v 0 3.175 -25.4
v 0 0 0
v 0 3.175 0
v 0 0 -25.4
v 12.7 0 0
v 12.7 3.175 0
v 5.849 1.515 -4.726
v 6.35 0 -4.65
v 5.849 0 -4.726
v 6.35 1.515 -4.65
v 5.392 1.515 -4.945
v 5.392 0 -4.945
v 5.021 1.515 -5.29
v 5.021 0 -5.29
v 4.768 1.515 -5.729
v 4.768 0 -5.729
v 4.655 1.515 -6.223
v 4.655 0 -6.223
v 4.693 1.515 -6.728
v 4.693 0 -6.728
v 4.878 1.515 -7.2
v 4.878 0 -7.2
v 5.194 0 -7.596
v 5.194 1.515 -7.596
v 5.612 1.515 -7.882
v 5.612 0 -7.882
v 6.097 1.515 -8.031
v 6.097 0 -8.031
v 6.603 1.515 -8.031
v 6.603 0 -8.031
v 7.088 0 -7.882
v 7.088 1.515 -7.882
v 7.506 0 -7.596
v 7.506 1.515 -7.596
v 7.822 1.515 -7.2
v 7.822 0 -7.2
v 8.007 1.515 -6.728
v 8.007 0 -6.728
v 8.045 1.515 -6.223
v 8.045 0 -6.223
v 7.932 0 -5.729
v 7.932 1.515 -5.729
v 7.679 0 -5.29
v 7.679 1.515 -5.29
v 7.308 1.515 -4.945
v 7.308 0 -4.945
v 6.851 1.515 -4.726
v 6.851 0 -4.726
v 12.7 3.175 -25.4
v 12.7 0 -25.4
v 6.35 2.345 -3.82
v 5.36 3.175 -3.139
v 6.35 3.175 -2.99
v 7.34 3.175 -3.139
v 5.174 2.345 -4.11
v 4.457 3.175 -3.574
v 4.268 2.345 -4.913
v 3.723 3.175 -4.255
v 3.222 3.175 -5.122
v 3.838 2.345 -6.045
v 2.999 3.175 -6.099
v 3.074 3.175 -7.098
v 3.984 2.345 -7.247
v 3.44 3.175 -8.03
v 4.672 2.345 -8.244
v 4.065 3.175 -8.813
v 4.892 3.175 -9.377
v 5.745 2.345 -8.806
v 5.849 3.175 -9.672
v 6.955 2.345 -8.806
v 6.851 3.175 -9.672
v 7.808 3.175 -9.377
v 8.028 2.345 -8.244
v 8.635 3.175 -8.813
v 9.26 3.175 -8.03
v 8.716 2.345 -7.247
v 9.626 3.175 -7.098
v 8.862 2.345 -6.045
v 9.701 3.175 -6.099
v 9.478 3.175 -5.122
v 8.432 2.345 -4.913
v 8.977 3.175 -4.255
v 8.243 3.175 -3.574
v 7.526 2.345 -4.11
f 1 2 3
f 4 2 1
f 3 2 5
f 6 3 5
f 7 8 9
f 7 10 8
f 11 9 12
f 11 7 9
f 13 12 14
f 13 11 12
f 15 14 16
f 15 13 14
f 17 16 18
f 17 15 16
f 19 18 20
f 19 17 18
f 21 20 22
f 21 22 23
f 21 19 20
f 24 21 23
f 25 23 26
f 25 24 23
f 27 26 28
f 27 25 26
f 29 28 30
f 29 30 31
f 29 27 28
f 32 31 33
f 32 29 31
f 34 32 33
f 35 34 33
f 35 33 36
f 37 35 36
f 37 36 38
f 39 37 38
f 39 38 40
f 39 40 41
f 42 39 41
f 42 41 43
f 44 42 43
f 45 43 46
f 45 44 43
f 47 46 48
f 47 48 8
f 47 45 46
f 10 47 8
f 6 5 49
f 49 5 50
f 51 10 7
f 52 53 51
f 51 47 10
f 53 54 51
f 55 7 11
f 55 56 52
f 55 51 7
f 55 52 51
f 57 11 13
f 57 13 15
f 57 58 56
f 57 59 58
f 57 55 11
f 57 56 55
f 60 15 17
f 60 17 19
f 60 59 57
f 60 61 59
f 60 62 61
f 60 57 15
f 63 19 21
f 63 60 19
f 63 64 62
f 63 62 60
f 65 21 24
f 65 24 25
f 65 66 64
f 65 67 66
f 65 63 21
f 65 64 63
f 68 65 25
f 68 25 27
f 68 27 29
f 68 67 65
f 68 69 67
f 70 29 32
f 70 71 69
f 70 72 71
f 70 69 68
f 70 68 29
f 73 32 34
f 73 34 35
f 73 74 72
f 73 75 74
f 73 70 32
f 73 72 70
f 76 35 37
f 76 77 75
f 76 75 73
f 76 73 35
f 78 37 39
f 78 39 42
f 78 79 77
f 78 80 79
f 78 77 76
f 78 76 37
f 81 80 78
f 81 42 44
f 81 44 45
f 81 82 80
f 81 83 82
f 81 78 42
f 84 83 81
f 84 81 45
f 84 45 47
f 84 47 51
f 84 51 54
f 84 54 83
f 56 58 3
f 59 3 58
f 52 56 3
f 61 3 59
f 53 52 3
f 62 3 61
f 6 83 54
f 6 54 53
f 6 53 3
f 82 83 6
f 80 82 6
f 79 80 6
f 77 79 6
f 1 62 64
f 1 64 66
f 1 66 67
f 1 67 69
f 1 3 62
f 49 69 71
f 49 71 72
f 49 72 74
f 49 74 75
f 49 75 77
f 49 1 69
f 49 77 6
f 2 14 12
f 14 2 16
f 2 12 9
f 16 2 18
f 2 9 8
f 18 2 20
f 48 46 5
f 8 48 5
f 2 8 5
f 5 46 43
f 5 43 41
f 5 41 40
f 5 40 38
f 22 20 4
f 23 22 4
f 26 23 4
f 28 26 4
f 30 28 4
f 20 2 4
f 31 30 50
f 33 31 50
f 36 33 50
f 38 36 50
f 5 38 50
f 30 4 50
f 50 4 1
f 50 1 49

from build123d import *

# Parameters (mm, degrees)
SKETCH9_W           = 12.7
SKETCH9_H           = 25.4
BOSS_EXTRUDE1_DEPTH = 3.175


with BuildPart() as part:
    # Sketch9 → Boss-Extrude1 (new body)
    with BuildSketch(Plane(origin=(0, 0, 0), x_dir=(1, 0, 0), z_dir=(0, 1, 0))):
        with Locations((6.35, 12.7)):
            Rectangle(SKETCH9_W, SKETCH9_H)
    extrude(amount=BOSS_EXTRUDE1_DEPTH)

    # Sketch10 → CSK for M3 SFHCS2 (revolve, cut)
    with BuildSketch(Plane(origin=(6.35, 3.175, -6.35), x_dir=(0, 0, 1), z_dir=(1, 0, 0))):
        Polygon((0, 0), (0, 3.175), (1.7, 3.175), (1.7, 1.66), (3.36, 0), align=None)
    revolve(axis=Axis((6.35, 9.525, -6.35), (0, -1, 0)), mode=Mode.SUBTRACT)


solid = part.part
